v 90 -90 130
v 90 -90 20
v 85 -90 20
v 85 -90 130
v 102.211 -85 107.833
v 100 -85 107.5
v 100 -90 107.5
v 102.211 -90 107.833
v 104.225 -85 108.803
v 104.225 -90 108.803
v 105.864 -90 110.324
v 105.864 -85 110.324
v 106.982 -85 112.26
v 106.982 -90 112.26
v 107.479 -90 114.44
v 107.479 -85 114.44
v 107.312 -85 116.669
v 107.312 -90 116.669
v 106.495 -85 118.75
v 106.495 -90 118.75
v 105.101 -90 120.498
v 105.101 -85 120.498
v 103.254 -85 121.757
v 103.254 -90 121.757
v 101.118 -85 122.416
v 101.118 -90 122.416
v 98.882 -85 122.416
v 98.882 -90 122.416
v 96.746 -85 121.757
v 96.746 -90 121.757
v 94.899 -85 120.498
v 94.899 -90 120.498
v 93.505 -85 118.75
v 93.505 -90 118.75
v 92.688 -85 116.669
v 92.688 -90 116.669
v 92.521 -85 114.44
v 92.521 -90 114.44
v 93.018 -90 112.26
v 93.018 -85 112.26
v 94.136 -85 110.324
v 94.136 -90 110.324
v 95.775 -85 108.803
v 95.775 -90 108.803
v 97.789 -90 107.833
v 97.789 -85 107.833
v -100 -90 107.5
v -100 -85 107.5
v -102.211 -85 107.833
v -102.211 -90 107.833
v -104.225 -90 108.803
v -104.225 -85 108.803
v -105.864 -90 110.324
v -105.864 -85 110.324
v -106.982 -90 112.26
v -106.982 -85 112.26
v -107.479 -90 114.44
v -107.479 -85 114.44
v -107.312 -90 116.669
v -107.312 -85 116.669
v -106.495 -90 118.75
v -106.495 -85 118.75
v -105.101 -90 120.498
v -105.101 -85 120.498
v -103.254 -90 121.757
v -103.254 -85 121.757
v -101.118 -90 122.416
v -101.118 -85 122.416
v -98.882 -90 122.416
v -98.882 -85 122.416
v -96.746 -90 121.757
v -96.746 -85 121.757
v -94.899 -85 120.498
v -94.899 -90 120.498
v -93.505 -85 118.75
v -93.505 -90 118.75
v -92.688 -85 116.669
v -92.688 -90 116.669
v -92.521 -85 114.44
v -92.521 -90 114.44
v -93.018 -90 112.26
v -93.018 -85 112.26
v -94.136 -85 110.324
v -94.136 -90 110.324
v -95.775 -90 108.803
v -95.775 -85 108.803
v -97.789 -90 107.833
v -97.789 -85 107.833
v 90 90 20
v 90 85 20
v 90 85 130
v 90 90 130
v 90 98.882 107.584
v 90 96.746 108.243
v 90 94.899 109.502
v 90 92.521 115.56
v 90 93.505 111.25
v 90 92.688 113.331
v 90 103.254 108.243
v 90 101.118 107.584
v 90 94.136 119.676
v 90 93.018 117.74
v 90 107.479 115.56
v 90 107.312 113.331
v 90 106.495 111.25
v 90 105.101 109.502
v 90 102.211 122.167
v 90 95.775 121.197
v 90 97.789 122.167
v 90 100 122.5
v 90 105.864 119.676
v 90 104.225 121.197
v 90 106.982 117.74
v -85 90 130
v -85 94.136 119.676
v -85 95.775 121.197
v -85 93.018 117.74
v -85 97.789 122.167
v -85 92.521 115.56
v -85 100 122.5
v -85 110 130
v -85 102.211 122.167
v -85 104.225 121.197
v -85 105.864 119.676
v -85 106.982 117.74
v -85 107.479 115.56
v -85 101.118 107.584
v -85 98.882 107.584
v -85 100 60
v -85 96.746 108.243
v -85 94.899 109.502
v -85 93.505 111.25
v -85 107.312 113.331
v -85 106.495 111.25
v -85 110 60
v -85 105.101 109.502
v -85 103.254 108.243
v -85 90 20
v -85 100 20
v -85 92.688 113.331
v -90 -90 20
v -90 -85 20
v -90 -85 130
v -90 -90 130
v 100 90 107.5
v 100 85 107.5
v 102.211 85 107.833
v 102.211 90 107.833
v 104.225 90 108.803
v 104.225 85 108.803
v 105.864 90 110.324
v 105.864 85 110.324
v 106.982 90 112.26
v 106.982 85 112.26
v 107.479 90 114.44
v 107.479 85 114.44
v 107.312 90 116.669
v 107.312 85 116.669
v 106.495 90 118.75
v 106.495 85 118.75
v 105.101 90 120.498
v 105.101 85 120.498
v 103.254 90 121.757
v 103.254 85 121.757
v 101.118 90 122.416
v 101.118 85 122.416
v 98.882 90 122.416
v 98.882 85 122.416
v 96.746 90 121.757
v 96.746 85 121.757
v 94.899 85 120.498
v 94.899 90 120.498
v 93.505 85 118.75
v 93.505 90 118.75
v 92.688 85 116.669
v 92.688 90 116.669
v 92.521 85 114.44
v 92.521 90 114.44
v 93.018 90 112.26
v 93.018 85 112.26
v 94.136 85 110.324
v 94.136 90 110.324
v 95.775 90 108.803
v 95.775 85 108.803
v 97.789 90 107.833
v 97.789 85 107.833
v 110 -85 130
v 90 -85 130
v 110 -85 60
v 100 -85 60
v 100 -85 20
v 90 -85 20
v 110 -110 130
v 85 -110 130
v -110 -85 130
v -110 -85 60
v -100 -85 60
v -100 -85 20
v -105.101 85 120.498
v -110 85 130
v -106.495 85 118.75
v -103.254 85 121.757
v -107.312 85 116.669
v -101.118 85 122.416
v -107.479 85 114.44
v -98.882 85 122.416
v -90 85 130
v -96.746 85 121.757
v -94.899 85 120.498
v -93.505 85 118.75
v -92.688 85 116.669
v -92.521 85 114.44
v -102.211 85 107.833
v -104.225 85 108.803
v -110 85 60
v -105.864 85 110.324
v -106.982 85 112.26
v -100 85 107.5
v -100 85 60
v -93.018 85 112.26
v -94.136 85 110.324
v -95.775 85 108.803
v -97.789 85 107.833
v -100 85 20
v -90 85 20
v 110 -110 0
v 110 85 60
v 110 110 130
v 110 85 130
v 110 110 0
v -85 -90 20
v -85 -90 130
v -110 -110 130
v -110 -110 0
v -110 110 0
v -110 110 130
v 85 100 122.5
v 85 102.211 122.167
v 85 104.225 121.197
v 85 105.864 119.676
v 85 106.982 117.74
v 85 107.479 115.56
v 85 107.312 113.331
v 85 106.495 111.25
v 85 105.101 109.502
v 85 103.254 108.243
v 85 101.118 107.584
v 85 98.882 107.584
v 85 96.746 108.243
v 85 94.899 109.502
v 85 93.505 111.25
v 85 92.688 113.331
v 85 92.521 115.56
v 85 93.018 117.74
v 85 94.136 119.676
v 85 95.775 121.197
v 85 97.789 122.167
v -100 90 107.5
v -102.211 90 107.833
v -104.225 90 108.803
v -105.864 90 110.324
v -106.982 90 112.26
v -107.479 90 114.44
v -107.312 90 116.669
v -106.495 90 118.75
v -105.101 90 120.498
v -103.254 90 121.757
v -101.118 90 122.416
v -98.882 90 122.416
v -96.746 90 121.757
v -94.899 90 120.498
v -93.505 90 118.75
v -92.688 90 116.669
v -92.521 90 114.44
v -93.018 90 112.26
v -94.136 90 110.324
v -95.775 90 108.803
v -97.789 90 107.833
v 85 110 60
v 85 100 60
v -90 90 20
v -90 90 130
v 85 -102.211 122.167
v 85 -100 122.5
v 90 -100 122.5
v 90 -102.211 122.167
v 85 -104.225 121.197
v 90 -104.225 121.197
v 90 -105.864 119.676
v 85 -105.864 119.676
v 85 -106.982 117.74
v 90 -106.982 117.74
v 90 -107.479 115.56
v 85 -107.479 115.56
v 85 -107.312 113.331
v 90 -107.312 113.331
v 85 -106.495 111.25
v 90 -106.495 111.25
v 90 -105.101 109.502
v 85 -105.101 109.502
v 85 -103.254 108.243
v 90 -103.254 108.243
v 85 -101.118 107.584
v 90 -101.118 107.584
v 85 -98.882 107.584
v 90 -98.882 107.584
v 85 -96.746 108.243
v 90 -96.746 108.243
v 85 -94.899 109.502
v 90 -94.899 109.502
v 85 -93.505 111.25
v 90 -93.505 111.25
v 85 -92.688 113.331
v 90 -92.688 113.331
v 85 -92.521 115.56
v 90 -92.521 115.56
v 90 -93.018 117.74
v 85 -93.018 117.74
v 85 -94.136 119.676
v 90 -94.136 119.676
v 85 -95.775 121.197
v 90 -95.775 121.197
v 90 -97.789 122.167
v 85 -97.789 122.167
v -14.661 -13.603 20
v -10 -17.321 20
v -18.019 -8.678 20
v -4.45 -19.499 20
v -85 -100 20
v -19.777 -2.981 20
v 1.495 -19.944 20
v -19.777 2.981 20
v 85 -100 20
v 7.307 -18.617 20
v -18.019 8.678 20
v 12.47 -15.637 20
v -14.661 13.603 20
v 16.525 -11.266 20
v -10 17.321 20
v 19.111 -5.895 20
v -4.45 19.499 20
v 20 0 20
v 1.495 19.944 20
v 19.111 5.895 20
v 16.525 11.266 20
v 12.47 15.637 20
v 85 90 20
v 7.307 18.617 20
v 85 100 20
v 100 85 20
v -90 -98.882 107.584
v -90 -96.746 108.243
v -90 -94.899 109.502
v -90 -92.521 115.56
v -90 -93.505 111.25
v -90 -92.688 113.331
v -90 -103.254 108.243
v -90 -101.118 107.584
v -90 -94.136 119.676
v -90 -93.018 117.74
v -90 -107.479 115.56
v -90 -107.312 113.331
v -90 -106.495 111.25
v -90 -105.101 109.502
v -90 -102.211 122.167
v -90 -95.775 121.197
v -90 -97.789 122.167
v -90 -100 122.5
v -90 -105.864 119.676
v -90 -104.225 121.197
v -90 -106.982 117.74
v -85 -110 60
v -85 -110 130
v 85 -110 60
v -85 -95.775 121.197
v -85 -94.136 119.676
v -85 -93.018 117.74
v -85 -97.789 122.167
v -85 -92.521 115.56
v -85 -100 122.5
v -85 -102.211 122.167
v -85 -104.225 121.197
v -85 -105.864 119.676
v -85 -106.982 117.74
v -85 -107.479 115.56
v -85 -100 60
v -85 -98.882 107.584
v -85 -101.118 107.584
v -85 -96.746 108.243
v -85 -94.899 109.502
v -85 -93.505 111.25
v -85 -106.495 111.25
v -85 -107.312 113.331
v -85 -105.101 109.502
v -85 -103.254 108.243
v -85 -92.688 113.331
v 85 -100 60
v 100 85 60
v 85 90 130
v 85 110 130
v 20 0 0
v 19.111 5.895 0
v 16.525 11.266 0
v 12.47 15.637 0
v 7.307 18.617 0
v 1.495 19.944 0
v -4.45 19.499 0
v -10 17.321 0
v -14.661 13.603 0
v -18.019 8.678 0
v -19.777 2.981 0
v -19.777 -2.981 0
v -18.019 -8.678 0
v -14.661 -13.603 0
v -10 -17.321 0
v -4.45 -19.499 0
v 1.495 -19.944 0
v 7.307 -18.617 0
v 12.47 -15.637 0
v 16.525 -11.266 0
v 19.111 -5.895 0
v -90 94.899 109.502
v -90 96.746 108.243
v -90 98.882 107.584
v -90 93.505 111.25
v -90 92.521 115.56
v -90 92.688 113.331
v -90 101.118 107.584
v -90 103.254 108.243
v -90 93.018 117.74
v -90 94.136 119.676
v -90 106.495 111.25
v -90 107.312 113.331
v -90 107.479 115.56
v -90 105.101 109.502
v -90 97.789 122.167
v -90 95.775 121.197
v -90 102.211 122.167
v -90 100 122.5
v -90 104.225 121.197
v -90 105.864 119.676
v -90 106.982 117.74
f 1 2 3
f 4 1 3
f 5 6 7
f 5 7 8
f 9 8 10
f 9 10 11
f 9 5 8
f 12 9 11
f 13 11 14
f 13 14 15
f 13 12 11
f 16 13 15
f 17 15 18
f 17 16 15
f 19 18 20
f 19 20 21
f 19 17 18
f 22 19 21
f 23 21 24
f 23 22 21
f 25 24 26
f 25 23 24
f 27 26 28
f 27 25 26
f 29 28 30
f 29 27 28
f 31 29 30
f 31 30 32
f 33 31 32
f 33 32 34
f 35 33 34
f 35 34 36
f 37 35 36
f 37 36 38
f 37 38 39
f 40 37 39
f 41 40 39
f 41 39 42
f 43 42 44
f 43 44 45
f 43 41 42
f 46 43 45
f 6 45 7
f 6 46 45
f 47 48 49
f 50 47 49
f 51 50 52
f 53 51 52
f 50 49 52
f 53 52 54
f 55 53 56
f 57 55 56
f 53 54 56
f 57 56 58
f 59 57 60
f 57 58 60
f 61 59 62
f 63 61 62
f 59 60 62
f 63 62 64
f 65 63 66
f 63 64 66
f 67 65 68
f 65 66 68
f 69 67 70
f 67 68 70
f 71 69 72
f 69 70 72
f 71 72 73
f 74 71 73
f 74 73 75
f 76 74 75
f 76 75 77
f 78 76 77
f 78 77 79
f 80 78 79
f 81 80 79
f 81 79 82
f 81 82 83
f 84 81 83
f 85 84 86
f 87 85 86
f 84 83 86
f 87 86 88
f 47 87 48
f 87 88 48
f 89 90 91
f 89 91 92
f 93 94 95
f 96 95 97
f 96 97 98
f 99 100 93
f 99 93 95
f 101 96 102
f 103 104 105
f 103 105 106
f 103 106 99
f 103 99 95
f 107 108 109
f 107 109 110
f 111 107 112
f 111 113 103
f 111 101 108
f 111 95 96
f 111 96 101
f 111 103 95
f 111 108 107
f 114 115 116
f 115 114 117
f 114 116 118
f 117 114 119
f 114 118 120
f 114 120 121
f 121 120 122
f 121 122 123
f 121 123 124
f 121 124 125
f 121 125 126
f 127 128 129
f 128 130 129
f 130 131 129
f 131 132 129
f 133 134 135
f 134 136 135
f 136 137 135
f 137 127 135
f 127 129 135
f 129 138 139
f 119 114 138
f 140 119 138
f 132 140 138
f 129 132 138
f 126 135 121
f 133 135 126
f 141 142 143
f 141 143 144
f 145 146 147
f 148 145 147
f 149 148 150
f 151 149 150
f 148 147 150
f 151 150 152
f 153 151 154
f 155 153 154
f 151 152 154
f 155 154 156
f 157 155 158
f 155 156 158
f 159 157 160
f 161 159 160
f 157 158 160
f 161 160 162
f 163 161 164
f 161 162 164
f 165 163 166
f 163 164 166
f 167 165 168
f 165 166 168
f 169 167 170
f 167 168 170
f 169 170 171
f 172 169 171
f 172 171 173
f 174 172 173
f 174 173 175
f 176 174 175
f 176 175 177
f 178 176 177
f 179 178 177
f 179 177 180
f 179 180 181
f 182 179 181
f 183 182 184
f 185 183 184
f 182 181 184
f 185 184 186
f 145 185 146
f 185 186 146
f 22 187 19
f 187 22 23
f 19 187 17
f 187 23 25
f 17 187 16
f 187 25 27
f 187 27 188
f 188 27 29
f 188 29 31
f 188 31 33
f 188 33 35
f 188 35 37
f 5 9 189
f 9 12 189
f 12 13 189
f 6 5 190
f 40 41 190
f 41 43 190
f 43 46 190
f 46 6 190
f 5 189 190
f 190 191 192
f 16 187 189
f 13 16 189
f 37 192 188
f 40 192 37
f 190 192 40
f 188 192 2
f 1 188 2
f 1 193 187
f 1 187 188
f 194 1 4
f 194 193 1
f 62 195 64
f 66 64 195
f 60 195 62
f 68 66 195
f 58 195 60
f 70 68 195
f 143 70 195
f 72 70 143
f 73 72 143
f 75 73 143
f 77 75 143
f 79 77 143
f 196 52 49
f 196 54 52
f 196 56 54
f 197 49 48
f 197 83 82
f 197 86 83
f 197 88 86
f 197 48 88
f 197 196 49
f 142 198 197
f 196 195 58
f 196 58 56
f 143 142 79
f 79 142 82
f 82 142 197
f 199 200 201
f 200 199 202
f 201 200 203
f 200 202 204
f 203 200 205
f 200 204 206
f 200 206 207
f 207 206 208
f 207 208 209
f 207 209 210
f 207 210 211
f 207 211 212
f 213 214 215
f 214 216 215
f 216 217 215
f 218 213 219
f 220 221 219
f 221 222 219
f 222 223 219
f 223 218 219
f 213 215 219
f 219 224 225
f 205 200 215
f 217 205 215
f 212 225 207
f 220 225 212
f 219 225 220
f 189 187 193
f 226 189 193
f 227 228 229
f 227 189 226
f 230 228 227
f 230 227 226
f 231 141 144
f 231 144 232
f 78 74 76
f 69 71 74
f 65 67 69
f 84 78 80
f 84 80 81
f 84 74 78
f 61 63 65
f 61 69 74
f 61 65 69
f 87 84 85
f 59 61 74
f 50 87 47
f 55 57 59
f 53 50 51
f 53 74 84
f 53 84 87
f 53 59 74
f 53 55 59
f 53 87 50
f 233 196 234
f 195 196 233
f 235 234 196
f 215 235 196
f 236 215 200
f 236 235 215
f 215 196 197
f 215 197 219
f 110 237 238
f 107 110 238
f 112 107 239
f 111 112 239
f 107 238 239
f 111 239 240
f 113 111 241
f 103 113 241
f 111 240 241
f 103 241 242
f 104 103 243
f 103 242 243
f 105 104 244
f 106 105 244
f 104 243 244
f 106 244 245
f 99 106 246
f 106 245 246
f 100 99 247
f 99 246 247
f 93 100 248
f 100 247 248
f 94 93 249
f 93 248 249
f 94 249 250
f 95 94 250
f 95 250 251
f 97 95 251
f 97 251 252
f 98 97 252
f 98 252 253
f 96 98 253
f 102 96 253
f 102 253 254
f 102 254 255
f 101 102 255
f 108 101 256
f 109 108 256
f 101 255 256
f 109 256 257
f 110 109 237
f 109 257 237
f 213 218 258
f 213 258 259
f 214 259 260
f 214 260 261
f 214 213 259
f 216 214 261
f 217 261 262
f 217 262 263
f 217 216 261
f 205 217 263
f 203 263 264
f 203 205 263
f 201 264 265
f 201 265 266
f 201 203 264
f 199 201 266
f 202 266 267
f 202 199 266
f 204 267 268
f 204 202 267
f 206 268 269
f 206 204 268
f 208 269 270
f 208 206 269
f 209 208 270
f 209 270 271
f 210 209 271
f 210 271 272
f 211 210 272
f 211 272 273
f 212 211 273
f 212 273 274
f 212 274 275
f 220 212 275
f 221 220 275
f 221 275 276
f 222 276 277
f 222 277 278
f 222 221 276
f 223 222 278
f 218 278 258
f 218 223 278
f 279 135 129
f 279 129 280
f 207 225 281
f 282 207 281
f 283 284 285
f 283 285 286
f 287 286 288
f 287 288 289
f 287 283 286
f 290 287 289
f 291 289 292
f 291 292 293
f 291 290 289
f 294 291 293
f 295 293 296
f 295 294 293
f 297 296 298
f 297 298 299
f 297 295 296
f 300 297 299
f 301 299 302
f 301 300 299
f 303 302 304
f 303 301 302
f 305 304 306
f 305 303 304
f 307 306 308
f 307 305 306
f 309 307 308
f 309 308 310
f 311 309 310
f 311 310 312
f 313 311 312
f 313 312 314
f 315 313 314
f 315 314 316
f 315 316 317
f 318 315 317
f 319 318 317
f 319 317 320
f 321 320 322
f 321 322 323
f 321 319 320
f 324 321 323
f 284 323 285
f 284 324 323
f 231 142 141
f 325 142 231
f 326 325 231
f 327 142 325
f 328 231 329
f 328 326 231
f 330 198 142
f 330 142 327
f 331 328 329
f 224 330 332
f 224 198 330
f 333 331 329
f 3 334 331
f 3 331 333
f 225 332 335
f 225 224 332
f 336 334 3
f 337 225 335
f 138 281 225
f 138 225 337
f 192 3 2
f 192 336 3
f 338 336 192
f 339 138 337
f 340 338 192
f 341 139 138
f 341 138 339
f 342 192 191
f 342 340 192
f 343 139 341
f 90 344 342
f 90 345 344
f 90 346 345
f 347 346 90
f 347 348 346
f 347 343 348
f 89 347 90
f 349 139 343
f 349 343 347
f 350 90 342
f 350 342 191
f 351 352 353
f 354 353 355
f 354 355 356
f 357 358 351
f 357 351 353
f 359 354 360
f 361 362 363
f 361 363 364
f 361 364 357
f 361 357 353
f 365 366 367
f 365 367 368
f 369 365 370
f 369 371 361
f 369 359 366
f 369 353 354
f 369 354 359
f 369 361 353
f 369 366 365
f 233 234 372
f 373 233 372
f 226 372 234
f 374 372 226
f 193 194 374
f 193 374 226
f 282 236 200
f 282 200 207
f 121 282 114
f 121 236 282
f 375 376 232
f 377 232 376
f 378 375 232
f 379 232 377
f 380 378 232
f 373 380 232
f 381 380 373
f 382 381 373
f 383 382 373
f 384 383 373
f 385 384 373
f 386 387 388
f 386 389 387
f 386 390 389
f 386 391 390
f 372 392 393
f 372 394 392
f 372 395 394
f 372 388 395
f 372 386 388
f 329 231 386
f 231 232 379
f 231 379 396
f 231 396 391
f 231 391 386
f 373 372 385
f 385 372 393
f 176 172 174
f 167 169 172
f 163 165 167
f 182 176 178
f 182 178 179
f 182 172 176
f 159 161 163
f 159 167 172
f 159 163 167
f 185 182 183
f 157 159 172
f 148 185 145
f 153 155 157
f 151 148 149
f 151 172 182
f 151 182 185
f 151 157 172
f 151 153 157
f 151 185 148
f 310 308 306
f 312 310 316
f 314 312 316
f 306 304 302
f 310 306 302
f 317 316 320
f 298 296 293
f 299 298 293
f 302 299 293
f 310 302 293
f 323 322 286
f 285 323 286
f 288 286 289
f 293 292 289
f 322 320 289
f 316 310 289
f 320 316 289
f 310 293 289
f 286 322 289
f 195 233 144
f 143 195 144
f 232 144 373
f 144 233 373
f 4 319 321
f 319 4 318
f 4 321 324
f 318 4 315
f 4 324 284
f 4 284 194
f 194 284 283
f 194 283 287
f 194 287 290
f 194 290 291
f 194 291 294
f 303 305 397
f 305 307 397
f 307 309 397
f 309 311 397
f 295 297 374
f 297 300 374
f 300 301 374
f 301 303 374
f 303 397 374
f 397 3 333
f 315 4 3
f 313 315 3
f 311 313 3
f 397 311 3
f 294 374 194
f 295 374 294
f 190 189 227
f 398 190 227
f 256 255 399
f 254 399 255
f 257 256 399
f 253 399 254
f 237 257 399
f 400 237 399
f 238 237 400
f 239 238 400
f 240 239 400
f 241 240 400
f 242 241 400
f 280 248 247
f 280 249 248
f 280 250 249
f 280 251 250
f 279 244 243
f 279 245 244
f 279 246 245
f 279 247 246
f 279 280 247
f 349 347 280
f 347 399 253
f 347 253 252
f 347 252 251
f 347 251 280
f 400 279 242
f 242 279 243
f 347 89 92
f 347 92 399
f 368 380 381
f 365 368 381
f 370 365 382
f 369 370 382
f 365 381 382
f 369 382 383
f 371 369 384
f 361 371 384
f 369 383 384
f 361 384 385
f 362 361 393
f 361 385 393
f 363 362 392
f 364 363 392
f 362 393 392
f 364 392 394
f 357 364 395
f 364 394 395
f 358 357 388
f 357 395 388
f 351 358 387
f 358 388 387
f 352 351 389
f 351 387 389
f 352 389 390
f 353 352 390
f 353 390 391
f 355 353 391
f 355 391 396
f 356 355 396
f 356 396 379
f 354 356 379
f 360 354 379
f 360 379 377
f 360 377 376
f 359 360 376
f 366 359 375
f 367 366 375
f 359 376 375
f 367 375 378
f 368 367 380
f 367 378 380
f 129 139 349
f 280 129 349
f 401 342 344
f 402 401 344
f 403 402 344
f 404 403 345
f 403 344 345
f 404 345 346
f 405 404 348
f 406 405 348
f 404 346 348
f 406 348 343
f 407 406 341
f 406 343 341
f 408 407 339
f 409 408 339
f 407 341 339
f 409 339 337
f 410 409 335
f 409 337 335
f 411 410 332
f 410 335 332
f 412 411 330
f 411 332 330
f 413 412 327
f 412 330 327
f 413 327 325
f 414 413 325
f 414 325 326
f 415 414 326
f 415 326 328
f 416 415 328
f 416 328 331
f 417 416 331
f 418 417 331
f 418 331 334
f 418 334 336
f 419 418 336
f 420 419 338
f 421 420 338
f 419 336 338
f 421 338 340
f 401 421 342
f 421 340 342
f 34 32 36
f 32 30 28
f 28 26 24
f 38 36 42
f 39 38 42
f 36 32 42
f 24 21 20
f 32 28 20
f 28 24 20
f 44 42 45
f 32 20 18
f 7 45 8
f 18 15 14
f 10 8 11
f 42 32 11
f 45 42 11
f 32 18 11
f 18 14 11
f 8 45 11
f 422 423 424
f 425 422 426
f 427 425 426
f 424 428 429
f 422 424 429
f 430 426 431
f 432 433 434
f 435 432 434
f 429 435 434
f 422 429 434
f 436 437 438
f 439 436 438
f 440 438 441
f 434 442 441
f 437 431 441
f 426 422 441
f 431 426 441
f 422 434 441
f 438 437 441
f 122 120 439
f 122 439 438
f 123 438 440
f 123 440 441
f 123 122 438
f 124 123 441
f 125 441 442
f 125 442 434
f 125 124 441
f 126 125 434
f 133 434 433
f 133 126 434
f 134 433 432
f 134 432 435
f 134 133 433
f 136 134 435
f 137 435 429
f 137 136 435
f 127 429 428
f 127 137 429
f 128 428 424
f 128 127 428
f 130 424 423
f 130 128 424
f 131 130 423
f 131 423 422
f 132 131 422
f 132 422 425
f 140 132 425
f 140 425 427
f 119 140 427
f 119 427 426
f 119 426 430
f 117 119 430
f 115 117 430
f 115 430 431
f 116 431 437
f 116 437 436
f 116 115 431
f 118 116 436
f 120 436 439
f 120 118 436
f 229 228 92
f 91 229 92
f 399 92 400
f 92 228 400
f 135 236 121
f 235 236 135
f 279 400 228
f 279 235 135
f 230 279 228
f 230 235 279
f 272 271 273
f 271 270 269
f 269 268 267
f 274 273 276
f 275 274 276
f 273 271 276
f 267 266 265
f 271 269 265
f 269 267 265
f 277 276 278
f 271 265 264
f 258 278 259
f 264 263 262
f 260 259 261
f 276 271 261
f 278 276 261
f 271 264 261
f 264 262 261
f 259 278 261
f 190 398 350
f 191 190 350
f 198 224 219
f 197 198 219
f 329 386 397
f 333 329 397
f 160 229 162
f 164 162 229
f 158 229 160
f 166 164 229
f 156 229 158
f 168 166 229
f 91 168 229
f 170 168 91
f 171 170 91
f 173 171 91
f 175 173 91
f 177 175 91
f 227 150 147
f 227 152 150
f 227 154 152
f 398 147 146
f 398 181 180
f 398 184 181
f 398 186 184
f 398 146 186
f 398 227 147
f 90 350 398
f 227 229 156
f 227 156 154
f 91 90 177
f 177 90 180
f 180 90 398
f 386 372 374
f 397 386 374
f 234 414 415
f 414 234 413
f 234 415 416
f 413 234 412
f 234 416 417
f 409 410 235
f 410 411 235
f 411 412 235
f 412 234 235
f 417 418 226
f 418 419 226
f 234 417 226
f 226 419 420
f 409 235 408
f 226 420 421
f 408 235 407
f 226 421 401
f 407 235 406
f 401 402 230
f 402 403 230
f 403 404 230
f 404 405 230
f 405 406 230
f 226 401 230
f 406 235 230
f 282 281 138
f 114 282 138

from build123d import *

# Parameters (mm, degrees)
SKETCH_1_W          = 220
SKETCH_1_H          = 220
EXTRUDE_1_DEPTH     = 20
EXTRUDE_3_DEPTH     = 110
SKETCH_4_R          = 7.5
CUT_EXTRUDE_2_DEPTH = 5
SKETCH_7_R          = 7.5
CUT_EXTRUDE_3_DEPTH = 5
SKETCH_10_W         = 40
SKETCH_10_H         = 170
EXTRUDE_5_DEPTH     = 10
SKETCH_11_W         = 170
SKETCH_11_H         = 40
EXTRUDE_6_DEPTH     = 10
SKETCH_12_W         = 40
SKETCH_12_H         = 170
EXTRUDE_7_DEPTH     = 10
SKETCH_13_W         = 170
SKETCH_13_H         = 40
EXTRUDE_8_DEPTH     = 10
SKETCH_16_R         = 20
CUT_EXTRUDE_6_DEPTH = 20


# Read off the part's stored shape, not the designer's step: 镜向2, 镜向5
with BuildPart() as part:
    # 草图1 → 凸台-拉伸1 (new body)
    with BuildSketch(Plane.XY):
        Rectangle(SKETCH_1_W, SKETCH_1_H)
    extrude(amount=EXTRUDE_1_DEPTH)

    # 草图2 → 凸台-拉伸3 (add)
    with BuildSketch(Plane.XY.offset(20)):
        Polygon((85, 110), (110, 110), (110, 85), (90, 85), (90, 90), (85, 90), align=None)
    extrude(amount=EXTRUDE_3_DEPTH)

    # 草图4 → 切除-拉伸2 (cut)
    with BuildSketch(Plane(origin=(0, 85, 0), x_dir=(-1, 0, 0), z_dir=(0, -1, 0))):
        with Locations(Location((-100, -115, 0), (0, 0, 90))):
            Circle(SKETCH_4_R)
    extrude(amount=-CUT_EXTRUDE_2_DEPTH, mode=Mode.SUBTRACT)

    # 草图7 → 切除-拉伸3 (cut)
    with BuildSketch(Plane.ZY.offset(-85)):
        with Locations((115, 100)):
            Circle(SKETCH_7_R)
    extrude(amount=-CUT_EXTRUDE_3_DEPTH, mode=Mode.SUBTRACT)

    # 镜向2: part across plane


with BuildPart() as part_1:
    add(part.part)
    add(part.part.mirror(Plane(origin=(0, 0, 0), x_dir=(0, 0, 1), z_dir=(1, 0, 0))))

    # 镜向5: part across plane


with BuildPart() as part_2:
    add(part_1.part)
    add(part_1.part.mirror(Plane.ZX))

    # 草图10 → 凸台-拉伸5 (add)
    with BuildSketch(Plane(origin=(110, 0, 0), x_dir=(0, 0, -1), z_dir=(1, 0, 0))):
        with Locations((-40, 0)):
            Rectangle(SKETCH_10_W, SKETCH_10_H)
    extrude(amount=-EXTRUDE_5_DEPTH)

    # 草图11 → 凸台-拉伸6 (add)
    with BuildSketch(Plane.XZ.offset(110)):
        with Locations((0, 40)):
            Rectangle(SKETCH_11_W, SKETCH_11_H)
    extrude(amount=-EXTRUDE_6_DEPTH)

    # 草图12 → 凸台-拉伸7 (add)
    with BuildSketch(Plane.ZY.offset(110)):
        with Locations((40, 0)):
            Rectangle(SKETCH_12_W, SKETCH_12_H)
    extrude(amount=-EXTRUDE_7_DEPTH)

    # 草图13 → 凸台-拉伸8 (add)
    with BuildSketch(Plane(origin=(0, 110, 0), x_dir=(1, 0, 0), z_dir=(0, 1, 0))):
        with Locations((0, -40)):
            Rectangle(SKETCH_13_W, SKETCH_13_H)
    extrude(amount=-EXTRUDE_8_DEPTH)

    # 草图16 → 切除-拉伸6 (cut)
    with BuildSketch(Plane.XY.offset(20)):
        Circle(SKETCH_16_R)
    extrude(amount=-CUT_EXTRUDE_6_DEPTH, mode=Mode.SUBTRACT)


solid = part_2.part
